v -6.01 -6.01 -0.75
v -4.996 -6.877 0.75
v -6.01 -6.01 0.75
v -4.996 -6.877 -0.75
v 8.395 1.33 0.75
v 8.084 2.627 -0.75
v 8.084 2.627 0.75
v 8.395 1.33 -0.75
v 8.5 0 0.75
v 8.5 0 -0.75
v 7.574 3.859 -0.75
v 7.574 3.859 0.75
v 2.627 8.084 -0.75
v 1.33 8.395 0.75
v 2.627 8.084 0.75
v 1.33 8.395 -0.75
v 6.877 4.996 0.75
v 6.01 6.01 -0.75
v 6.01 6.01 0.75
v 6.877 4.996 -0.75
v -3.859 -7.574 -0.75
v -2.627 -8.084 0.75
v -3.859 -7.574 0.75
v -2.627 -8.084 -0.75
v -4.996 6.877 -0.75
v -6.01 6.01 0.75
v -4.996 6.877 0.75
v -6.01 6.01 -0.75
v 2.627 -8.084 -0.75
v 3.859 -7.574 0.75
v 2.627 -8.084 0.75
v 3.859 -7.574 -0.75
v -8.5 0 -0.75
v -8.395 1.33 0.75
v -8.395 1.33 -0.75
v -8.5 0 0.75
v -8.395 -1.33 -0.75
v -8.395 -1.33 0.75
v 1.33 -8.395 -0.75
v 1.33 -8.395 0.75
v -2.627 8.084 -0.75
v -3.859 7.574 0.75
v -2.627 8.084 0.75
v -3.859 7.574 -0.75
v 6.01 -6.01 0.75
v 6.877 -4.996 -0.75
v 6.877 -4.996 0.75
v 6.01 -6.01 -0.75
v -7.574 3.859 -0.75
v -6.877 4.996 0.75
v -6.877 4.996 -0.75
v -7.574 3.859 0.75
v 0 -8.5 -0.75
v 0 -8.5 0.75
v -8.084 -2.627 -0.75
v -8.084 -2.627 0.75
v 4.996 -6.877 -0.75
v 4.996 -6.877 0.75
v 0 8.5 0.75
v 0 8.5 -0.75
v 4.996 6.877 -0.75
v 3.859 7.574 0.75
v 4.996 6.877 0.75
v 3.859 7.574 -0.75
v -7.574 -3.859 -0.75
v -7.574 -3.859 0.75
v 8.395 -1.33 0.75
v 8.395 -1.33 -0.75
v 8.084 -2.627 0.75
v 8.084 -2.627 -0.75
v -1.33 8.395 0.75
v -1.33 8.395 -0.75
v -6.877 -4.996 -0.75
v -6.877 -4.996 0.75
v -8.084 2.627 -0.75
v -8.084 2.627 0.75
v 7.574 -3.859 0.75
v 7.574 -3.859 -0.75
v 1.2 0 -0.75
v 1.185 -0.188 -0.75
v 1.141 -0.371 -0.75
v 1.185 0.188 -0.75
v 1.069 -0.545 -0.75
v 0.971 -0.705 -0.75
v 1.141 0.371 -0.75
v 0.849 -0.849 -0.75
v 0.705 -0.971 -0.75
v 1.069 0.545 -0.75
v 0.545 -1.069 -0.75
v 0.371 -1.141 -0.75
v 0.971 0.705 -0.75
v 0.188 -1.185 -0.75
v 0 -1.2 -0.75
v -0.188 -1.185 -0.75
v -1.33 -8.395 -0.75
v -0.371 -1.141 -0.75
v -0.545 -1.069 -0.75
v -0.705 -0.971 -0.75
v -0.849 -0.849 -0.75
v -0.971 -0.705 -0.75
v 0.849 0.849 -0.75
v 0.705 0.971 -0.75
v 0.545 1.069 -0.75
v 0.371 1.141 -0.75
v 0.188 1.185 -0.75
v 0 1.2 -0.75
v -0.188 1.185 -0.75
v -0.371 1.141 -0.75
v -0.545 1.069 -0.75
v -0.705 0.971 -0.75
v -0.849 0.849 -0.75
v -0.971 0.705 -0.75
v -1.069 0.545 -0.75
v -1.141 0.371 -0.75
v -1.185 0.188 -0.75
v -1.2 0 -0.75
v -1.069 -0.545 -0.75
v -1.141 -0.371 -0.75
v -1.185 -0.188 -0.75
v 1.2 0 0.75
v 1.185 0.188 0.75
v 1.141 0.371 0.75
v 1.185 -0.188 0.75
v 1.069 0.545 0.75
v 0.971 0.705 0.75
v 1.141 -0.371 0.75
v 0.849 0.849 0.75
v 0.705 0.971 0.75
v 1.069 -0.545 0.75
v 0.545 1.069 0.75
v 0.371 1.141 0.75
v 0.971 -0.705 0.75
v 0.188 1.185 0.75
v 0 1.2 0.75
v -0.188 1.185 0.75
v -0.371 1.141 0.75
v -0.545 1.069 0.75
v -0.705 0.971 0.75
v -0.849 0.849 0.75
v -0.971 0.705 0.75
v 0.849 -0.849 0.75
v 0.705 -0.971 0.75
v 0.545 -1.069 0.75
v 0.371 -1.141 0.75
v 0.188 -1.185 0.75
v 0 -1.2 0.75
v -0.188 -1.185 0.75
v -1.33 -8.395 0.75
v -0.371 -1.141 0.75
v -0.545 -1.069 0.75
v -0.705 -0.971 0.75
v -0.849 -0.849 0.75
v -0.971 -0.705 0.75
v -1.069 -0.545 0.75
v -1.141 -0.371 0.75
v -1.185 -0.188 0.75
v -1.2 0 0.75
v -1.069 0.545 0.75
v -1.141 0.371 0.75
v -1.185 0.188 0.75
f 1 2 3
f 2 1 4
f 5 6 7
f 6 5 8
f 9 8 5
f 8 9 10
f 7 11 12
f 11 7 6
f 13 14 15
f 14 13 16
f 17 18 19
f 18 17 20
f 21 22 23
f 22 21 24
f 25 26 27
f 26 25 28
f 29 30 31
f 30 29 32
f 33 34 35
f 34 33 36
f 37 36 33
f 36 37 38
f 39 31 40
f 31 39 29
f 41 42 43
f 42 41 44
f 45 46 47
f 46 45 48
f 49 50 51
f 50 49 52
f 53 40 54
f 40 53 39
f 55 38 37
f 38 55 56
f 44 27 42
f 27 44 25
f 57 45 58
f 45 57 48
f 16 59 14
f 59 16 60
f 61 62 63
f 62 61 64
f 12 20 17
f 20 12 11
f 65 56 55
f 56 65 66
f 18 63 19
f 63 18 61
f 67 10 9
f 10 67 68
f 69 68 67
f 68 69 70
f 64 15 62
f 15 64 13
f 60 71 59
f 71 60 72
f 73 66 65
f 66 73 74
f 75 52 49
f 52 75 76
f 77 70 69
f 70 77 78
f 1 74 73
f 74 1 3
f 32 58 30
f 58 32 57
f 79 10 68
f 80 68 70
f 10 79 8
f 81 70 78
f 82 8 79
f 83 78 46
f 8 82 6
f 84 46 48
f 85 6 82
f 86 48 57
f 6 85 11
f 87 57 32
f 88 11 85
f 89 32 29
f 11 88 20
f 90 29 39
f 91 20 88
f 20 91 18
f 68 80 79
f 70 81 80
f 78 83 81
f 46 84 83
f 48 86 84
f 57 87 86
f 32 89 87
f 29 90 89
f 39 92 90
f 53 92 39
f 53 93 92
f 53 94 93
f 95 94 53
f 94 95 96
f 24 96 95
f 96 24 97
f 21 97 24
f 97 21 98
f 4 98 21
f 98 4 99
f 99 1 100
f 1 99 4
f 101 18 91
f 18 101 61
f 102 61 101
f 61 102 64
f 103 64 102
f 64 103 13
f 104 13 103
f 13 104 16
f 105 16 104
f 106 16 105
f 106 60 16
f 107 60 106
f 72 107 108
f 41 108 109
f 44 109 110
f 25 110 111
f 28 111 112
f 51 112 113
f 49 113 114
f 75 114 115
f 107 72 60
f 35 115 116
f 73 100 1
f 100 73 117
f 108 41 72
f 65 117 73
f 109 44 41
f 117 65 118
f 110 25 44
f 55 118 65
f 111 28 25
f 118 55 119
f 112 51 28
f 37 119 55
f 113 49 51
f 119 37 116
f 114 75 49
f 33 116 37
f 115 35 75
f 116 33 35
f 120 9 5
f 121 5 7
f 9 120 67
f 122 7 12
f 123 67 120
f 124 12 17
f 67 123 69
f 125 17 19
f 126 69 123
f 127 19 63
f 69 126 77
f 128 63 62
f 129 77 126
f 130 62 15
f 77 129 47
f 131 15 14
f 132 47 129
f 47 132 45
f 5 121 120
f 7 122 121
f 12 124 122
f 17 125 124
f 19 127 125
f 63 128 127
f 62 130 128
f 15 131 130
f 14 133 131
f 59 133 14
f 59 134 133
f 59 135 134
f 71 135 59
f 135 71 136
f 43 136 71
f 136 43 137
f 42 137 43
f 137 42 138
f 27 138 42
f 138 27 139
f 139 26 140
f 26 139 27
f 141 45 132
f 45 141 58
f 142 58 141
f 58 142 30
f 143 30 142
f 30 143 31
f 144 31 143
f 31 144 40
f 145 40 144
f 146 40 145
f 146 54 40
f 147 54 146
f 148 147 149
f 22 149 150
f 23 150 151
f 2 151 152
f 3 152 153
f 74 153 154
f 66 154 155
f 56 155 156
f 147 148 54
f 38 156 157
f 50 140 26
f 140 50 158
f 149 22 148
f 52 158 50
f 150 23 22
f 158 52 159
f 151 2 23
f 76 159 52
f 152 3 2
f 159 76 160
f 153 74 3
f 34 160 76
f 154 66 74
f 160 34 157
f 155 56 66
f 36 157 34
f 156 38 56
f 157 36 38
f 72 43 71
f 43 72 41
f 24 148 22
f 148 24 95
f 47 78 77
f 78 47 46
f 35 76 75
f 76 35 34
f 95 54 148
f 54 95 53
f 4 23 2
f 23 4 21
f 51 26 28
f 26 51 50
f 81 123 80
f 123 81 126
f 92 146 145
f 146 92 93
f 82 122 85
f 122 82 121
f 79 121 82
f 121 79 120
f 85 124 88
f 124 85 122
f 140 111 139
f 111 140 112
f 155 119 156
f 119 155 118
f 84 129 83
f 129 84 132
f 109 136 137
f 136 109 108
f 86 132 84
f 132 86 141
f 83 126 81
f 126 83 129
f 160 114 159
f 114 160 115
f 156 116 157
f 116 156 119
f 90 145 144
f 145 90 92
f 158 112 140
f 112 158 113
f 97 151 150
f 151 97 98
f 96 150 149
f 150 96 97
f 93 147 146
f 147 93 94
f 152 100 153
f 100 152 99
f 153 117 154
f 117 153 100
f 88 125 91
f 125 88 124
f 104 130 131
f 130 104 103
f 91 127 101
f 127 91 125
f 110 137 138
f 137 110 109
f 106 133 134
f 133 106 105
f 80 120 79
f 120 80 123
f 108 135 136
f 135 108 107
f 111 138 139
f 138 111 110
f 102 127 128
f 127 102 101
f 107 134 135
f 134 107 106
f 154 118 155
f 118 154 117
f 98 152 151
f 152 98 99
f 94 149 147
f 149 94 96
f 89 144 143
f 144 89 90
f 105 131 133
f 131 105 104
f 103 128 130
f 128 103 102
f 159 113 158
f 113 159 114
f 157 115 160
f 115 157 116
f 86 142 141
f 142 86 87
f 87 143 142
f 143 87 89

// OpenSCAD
// Control how "good" the circles are
$fn = $preview ? 20 : 40;

module main() {
    h = 1.5;
    difference() {
        cylinder(h=h, d=17, center=true);
        cylinder(h=h, d=2.4, center=true);
        };

};


main();
